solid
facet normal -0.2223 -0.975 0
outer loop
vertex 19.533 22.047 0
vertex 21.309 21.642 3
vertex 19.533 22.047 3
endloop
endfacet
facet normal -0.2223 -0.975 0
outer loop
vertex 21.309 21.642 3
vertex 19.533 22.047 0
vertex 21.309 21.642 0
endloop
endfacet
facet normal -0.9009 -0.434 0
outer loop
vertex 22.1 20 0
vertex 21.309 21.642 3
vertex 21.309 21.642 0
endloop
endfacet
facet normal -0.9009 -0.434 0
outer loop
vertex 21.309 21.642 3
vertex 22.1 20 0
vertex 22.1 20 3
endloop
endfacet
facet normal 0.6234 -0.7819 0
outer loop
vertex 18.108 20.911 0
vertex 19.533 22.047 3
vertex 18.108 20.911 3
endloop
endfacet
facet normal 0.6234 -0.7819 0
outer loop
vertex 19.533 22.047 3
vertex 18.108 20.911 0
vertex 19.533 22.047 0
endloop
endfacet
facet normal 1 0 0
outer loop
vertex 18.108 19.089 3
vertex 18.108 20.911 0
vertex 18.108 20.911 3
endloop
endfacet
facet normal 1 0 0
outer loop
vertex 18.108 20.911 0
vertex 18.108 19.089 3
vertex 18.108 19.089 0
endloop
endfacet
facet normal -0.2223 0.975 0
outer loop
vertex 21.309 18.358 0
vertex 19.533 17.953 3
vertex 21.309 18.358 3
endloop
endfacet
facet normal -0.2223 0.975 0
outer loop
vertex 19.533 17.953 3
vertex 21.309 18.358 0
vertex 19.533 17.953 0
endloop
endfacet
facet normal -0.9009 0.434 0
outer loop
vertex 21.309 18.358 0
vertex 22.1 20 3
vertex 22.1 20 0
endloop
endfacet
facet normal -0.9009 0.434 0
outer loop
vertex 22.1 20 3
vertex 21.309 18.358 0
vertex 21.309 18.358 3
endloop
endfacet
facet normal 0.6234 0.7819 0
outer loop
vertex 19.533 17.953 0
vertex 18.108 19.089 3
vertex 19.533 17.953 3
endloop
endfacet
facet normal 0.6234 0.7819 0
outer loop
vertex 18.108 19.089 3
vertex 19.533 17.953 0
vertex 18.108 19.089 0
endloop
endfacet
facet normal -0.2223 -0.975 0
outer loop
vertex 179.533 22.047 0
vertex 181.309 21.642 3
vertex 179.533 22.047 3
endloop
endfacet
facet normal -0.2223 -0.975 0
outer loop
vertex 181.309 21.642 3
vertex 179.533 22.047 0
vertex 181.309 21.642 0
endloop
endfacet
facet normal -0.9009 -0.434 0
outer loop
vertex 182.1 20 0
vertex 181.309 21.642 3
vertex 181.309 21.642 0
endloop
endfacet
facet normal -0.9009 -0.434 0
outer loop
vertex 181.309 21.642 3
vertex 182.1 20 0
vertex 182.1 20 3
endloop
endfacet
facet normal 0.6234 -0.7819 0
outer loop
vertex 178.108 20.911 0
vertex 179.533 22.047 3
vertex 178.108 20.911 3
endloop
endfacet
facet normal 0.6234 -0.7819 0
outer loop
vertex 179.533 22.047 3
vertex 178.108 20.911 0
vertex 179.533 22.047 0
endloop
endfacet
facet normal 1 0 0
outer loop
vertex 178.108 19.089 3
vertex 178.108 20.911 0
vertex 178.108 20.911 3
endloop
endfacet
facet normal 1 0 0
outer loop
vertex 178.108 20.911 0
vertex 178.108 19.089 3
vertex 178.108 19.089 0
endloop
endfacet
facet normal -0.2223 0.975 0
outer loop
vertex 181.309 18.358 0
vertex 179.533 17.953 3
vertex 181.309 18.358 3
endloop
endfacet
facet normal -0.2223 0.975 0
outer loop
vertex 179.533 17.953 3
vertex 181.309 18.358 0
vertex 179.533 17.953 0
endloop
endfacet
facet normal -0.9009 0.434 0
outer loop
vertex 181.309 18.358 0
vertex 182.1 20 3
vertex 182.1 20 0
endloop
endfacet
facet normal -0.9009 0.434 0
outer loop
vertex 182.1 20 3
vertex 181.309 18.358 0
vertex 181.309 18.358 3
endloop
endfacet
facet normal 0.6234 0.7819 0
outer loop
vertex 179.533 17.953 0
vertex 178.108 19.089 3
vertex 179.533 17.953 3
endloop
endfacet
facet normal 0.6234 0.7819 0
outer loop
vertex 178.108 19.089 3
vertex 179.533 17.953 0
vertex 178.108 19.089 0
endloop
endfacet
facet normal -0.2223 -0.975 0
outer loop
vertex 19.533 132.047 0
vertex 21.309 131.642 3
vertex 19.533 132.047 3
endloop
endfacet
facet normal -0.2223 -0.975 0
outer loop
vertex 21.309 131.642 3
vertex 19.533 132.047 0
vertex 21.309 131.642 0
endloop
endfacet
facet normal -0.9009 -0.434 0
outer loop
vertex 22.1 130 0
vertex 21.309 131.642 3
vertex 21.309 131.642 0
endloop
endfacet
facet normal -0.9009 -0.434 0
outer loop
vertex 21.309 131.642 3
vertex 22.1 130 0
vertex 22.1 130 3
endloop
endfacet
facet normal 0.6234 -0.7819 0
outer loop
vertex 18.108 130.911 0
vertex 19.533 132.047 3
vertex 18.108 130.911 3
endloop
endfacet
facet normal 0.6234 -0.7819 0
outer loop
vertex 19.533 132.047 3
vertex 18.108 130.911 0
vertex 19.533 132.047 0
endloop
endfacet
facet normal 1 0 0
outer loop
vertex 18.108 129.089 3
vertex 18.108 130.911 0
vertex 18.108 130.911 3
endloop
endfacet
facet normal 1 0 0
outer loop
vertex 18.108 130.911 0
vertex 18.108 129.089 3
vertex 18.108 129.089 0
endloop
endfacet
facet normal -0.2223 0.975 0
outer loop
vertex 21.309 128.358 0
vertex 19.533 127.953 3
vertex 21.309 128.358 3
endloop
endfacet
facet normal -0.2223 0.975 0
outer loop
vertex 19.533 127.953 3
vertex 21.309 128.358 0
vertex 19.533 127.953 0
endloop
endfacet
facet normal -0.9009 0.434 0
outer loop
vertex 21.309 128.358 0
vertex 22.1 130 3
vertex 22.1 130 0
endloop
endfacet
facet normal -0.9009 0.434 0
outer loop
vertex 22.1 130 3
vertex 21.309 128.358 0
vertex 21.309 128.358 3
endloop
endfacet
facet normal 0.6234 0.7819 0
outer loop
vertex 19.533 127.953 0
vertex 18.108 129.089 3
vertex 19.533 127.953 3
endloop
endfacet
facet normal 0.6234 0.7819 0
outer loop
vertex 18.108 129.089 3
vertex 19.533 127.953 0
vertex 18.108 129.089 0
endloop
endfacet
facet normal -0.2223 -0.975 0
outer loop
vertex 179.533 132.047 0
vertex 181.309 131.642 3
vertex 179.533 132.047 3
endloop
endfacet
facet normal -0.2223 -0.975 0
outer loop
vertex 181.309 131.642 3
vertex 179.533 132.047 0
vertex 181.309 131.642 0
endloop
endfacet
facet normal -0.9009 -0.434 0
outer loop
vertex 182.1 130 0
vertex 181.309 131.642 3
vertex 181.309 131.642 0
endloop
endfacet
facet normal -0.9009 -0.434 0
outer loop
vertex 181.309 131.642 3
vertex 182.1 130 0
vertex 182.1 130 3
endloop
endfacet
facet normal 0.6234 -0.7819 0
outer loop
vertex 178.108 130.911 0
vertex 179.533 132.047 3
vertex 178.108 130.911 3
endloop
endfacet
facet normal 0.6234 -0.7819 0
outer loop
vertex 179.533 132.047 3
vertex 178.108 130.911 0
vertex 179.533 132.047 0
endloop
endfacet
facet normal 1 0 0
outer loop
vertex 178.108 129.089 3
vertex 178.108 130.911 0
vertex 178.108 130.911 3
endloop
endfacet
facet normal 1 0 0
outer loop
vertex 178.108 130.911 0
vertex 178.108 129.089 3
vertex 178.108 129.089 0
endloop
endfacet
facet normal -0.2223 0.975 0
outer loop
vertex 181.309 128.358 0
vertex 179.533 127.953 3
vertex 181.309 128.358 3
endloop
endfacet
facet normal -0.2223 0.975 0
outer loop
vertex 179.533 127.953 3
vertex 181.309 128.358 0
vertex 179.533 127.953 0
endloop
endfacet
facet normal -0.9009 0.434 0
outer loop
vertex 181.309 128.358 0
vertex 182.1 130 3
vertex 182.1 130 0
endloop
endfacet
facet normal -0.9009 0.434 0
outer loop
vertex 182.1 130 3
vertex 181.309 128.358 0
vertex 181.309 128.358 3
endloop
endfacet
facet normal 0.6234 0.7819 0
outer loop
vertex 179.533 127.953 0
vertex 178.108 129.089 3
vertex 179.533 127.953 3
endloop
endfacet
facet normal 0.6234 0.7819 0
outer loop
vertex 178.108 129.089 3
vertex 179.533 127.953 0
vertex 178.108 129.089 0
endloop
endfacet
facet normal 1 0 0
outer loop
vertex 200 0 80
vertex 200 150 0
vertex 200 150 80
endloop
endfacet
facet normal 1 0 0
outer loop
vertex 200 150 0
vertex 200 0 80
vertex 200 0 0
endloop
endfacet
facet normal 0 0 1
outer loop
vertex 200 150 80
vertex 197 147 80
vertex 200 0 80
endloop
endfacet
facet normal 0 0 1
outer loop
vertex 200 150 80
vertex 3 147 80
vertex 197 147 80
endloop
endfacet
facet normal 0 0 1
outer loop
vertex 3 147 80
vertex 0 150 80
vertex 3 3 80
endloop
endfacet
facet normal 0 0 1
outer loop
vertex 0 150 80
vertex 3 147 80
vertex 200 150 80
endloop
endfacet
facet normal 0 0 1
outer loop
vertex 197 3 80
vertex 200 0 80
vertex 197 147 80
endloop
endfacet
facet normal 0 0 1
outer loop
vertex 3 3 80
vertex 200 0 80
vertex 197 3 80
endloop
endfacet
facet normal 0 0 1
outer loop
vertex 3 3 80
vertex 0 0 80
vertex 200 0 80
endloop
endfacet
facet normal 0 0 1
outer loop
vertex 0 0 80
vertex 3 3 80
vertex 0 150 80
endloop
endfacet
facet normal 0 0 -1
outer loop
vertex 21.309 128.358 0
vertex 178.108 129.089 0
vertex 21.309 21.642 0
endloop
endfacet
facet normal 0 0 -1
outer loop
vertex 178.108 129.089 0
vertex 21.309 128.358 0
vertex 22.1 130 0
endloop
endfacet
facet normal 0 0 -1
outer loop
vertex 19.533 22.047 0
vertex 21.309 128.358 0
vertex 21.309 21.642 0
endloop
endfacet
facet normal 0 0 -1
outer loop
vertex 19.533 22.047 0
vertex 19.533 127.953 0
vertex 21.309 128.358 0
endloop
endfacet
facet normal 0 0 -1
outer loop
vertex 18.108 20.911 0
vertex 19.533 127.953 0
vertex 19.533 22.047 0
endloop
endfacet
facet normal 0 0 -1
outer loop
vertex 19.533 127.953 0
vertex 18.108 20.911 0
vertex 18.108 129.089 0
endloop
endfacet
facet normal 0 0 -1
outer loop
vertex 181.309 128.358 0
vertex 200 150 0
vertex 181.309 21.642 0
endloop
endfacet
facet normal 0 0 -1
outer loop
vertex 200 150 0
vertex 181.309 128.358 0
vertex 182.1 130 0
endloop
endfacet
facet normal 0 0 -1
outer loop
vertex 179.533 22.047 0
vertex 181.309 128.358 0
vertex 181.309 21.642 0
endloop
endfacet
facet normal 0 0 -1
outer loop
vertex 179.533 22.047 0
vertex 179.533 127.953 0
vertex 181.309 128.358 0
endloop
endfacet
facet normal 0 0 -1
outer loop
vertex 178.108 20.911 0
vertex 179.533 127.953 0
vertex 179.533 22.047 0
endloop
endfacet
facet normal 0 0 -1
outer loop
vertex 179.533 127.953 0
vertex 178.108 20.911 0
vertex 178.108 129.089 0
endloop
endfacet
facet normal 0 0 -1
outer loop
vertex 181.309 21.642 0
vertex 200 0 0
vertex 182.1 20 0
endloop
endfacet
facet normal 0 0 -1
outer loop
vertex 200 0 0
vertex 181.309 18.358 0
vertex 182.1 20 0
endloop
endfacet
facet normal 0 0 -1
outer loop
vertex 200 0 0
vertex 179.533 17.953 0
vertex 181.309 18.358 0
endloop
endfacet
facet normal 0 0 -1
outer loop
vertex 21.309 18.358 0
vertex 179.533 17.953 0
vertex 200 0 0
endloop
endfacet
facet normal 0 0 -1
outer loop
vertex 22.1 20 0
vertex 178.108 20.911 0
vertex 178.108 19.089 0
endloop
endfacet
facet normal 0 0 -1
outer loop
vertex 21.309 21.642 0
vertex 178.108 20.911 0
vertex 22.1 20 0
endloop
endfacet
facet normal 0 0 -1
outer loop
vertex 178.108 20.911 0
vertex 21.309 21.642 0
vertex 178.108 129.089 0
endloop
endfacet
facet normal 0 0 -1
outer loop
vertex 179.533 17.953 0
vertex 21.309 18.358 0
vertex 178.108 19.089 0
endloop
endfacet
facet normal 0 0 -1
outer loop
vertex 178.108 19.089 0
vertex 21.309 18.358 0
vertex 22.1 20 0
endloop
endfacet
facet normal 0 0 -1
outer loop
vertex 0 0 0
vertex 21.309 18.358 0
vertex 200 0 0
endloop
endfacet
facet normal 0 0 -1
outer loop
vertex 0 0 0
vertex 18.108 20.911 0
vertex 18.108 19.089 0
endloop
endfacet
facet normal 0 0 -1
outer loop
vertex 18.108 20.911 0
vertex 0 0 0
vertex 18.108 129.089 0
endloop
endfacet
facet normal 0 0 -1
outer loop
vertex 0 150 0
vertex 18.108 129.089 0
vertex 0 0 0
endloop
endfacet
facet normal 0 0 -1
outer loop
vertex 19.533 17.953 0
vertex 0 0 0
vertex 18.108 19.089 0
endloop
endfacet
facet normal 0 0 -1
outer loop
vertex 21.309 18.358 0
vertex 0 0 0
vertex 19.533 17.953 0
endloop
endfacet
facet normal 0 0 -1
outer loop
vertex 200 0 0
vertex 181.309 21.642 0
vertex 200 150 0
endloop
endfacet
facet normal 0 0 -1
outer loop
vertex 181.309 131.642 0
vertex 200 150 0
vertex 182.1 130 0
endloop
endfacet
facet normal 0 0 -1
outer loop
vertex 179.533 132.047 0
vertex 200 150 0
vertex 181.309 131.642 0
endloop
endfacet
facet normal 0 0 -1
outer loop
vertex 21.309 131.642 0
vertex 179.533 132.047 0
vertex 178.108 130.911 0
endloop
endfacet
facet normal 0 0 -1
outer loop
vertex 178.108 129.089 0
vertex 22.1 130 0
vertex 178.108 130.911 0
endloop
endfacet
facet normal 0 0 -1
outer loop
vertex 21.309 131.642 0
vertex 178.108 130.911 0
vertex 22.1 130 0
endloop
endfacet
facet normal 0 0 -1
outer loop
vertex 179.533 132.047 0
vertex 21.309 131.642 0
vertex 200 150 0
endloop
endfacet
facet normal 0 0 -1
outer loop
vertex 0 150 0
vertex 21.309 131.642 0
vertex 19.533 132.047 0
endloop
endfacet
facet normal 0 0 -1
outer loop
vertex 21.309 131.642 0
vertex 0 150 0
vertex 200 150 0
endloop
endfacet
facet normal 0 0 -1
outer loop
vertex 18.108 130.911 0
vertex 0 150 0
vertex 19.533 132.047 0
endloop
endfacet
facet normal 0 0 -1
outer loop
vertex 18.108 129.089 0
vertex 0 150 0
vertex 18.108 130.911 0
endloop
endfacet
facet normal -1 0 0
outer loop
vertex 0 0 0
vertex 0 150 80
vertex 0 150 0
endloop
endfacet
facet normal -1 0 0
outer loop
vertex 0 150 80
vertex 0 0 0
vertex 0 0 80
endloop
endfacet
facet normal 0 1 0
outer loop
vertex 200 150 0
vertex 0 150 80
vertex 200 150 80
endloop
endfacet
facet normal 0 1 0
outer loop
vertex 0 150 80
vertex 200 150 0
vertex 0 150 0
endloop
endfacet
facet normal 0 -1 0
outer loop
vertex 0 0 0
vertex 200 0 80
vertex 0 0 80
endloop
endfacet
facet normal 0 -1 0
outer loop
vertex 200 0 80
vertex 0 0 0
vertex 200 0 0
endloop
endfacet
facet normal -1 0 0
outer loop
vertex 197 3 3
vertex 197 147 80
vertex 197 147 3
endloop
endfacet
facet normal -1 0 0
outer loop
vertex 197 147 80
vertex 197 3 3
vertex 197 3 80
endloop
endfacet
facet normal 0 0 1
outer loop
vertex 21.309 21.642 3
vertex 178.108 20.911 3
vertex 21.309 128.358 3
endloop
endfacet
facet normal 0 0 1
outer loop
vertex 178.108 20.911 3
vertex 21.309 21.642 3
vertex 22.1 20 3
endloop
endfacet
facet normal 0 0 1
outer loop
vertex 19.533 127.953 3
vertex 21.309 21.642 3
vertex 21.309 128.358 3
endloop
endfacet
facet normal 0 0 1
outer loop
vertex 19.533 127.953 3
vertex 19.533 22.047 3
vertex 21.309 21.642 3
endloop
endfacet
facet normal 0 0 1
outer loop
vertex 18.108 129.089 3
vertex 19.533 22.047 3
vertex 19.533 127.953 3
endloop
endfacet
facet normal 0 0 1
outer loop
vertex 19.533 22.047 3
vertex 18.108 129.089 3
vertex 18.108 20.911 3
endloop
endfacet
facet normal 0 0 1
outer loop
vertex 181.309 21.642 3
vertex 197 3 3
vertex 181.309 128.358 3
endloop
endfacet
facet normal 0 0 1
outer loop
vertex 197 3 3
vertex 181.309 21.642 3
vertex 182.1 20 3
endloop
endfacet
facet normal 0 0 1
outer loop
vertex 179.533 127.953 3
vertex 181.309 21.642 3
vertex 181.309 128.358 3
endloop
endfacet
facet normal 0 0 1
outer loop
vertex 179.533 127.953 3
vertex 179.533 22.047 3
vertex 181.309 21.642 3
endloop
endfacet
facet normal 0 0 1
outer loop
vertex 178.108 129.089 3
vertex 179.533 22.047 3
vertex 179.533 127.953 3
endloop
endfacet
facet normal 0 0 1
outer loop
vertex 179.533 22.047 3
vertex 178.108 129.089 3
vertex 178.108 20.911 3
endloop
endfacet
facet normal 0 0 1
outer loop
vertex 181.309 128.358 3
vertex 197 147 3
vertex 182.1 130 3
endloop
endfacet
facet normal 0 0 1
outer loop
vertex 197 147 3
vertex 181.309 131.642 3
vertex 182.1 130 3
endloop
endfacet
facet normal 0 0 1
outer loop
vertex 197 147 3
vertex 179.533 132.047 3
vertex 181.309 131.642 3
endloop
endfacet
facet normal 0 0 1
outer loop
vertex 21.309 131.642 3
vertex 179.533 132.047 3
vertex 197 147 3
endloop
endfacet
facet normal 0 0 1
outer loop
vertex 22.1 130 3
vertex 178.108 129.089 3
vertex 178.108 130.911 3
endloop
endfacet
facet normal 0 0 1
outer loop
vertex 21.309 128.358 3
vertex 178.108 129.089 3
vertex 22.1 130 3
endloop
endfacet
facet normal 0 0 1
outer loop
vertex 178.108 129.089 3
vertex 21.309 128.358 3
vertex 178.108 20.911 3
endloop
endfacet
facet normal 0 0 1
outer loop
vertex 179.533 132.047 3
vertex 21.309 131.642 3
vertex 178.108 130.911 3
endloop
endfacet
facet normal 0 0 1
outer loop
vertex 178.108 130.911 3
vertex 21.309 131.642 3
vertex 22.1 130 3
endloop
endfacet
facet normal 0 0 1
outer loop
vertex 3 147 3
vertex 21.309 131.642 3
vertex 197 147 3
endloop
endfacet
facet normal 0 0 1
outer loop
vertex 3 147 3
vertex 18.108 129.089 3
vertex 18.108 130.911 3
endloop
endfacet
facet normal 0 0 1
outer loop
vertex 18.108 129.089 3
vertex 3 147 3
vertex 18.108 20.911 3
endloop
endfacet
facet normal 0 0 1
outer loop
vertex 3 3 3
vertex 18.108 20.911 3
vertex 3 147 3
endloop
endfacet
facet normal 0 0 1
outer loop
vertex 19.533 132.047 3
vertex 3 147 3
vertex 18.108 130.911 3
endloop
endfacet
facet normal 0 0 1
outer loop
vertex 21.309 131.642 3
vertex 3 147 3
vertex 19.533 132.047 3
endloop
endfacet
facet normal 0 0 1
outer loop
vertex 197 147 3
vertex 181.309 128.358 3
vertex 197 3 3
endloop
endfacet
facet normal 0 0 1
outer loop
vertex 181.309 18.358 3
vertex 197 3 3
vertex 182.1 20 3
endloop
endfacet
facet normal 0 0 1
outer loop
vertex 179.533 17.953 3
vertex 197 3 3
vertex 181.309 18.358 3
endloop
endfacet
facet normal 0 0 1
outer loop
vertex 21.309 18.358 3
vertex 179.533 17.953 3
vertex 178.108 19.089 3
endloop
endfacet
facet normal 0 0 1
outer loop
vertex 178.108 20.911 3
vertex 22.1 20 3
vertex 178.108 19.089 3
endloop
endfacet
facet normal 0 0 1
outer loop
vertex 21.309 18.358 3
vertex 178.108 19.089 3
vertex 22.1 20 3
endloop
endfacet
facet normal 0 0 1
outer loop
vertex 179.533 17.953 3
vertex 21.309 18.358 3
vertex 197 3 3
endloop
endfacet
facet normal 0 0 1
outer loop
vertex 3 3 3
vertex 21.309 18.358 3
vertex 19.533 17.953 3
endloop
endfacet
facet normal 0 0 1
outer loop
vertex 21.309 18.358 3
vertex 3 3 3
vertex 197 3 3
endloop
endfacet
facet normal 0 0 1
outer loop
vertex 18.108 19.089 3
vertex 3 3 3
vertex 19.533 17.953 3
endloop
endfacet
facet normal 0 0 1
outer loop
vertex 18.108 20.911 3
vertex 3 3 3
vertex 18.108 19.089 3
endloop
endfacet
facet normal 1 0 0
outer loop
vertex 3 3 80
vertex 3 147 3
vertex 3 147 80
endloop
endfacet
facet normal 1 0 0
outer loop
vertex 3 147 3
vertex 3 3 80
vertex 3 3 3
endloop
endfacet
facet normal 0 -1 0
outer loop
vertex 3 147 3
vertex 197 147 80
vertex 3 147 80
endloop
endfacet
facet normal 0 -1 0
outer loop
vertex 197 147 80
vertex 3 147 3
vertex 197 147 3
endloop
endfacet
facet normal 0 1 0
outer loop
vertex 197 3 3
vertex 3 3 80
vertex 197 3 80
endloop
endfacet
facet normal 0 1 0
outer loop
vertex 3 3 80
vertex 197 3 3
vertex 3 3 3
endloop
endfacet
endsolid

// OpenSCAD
// 🔋 Box Batteria per Urban Lab
// Materiale: PETG

// Parametri
width = 200;
depth = 150;
height = 80;
wall = 3;
mount_hole = 4.2; // M4

module box_batteria() {
    difference() {
        // Scatola esterna
        cube([width, depth, height]);
        
        // Cavità interna
        translate([wall, wall, wall])
            cube([width - 2*wall, depth - 2*wall, height - wall]);
        
        // Fori montaggio
        positions = [
            [20, 20],
            [width - 20, 20],
            [20, depth - 20],
            [width - 20, depth - 20]
        ];
        
        for (pos = positions) {
            translate([pos[0], pos[1], -1])
                cylinder(h = wall + 2, r = mount_hole/2);
        }
        
        // Aperture ventilazione
        for (x = [30:20:width-30]) {
            for (y = [30:20:depth-30]) {
                translate([x, y, height - wall])
                    cube([5, 5, wall + 1]);
            }
        }
    }
}

// Render
box_batteria();
